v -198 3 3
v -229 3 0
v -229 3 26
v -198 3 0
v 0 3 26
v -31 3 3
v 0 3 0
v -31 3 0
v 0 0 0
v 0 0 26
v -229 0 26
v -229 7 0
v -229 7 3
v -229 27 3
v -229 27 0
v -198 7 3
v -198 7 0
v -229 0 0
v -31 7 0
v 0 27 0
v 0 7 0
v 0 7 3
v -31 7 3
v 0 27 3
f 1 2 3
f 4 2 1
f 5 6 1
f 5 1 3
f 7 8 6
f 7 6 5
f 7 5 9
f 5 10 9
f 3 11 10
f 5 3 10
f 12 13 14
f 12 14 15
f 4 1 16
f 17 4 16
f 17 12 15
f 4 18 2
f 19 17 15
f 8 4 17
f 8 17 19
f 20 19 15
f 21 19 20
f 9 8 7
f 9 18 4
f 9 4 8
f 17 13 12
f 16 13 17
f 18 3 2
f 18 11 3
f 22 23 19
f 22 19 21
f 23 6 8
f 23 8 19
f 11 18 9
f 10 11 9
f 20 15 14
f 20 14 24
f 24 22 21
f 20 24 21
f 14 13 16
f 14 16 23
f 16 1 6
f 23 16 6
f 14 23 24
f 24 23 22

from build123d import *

# Parameters (mm, degrees)
SKETCH1_W           = 229
SKETCH1_H           = 26
BOSS_EXTRUDE1_DEPTH = 3
SKETCH2_W           = 229
SKETCH2_H           = 3
BOSS_EXTRUDE2_DEPTH = 24
SKETCH3_W           = 31
SKETCH3_H           = 4
CUT_EXTRUDE1_DEPTH  = 24


with BuildPart() as part:
    # Sketch1 → Boss-Extrude1 (new body)
    with BuildSketch(Plane(origin=(0, 0, 0), x_dir=(1, 0, 0), z_dir=(0, 1, 0))):
        with Locations((-114.5, -13)):
            Rectangle(SKETCH1_W, SKETCH1_H)
    extrude(amount=BOSS_EXTRUDE1_DEPTH)

    # Sketch2 → Boss-Extrude2 (add)
    with BuildSketch(Plane(origin=(0, 3, 0), x_dir=(1, 0, 0), z_dir=(0, 1, 0))):
        with Locations((-114.5, -1.5)):
            Rectangle(SKETCH2_W, SKETCH2_H)
    extrude(amount=BOSS_EXTRUDE2_DEPTH)

    # Sketch3 → Cut-Extrude1 (cut)
    with BuildSketch(Plane.XY.offset(3)):
        with Locations((-213.5, 5)):
            Rectangle(SKETCH3_W, SKETCH3_H)
        with Locations((-15.5, 5)):
            Rectangle(SKETCH3_W, SKETCH3_H)
    extrude(amount=-CUT_EXTRUDE1_DEPTH, mode=Mode.SUBTRACT)


solid = part.part
